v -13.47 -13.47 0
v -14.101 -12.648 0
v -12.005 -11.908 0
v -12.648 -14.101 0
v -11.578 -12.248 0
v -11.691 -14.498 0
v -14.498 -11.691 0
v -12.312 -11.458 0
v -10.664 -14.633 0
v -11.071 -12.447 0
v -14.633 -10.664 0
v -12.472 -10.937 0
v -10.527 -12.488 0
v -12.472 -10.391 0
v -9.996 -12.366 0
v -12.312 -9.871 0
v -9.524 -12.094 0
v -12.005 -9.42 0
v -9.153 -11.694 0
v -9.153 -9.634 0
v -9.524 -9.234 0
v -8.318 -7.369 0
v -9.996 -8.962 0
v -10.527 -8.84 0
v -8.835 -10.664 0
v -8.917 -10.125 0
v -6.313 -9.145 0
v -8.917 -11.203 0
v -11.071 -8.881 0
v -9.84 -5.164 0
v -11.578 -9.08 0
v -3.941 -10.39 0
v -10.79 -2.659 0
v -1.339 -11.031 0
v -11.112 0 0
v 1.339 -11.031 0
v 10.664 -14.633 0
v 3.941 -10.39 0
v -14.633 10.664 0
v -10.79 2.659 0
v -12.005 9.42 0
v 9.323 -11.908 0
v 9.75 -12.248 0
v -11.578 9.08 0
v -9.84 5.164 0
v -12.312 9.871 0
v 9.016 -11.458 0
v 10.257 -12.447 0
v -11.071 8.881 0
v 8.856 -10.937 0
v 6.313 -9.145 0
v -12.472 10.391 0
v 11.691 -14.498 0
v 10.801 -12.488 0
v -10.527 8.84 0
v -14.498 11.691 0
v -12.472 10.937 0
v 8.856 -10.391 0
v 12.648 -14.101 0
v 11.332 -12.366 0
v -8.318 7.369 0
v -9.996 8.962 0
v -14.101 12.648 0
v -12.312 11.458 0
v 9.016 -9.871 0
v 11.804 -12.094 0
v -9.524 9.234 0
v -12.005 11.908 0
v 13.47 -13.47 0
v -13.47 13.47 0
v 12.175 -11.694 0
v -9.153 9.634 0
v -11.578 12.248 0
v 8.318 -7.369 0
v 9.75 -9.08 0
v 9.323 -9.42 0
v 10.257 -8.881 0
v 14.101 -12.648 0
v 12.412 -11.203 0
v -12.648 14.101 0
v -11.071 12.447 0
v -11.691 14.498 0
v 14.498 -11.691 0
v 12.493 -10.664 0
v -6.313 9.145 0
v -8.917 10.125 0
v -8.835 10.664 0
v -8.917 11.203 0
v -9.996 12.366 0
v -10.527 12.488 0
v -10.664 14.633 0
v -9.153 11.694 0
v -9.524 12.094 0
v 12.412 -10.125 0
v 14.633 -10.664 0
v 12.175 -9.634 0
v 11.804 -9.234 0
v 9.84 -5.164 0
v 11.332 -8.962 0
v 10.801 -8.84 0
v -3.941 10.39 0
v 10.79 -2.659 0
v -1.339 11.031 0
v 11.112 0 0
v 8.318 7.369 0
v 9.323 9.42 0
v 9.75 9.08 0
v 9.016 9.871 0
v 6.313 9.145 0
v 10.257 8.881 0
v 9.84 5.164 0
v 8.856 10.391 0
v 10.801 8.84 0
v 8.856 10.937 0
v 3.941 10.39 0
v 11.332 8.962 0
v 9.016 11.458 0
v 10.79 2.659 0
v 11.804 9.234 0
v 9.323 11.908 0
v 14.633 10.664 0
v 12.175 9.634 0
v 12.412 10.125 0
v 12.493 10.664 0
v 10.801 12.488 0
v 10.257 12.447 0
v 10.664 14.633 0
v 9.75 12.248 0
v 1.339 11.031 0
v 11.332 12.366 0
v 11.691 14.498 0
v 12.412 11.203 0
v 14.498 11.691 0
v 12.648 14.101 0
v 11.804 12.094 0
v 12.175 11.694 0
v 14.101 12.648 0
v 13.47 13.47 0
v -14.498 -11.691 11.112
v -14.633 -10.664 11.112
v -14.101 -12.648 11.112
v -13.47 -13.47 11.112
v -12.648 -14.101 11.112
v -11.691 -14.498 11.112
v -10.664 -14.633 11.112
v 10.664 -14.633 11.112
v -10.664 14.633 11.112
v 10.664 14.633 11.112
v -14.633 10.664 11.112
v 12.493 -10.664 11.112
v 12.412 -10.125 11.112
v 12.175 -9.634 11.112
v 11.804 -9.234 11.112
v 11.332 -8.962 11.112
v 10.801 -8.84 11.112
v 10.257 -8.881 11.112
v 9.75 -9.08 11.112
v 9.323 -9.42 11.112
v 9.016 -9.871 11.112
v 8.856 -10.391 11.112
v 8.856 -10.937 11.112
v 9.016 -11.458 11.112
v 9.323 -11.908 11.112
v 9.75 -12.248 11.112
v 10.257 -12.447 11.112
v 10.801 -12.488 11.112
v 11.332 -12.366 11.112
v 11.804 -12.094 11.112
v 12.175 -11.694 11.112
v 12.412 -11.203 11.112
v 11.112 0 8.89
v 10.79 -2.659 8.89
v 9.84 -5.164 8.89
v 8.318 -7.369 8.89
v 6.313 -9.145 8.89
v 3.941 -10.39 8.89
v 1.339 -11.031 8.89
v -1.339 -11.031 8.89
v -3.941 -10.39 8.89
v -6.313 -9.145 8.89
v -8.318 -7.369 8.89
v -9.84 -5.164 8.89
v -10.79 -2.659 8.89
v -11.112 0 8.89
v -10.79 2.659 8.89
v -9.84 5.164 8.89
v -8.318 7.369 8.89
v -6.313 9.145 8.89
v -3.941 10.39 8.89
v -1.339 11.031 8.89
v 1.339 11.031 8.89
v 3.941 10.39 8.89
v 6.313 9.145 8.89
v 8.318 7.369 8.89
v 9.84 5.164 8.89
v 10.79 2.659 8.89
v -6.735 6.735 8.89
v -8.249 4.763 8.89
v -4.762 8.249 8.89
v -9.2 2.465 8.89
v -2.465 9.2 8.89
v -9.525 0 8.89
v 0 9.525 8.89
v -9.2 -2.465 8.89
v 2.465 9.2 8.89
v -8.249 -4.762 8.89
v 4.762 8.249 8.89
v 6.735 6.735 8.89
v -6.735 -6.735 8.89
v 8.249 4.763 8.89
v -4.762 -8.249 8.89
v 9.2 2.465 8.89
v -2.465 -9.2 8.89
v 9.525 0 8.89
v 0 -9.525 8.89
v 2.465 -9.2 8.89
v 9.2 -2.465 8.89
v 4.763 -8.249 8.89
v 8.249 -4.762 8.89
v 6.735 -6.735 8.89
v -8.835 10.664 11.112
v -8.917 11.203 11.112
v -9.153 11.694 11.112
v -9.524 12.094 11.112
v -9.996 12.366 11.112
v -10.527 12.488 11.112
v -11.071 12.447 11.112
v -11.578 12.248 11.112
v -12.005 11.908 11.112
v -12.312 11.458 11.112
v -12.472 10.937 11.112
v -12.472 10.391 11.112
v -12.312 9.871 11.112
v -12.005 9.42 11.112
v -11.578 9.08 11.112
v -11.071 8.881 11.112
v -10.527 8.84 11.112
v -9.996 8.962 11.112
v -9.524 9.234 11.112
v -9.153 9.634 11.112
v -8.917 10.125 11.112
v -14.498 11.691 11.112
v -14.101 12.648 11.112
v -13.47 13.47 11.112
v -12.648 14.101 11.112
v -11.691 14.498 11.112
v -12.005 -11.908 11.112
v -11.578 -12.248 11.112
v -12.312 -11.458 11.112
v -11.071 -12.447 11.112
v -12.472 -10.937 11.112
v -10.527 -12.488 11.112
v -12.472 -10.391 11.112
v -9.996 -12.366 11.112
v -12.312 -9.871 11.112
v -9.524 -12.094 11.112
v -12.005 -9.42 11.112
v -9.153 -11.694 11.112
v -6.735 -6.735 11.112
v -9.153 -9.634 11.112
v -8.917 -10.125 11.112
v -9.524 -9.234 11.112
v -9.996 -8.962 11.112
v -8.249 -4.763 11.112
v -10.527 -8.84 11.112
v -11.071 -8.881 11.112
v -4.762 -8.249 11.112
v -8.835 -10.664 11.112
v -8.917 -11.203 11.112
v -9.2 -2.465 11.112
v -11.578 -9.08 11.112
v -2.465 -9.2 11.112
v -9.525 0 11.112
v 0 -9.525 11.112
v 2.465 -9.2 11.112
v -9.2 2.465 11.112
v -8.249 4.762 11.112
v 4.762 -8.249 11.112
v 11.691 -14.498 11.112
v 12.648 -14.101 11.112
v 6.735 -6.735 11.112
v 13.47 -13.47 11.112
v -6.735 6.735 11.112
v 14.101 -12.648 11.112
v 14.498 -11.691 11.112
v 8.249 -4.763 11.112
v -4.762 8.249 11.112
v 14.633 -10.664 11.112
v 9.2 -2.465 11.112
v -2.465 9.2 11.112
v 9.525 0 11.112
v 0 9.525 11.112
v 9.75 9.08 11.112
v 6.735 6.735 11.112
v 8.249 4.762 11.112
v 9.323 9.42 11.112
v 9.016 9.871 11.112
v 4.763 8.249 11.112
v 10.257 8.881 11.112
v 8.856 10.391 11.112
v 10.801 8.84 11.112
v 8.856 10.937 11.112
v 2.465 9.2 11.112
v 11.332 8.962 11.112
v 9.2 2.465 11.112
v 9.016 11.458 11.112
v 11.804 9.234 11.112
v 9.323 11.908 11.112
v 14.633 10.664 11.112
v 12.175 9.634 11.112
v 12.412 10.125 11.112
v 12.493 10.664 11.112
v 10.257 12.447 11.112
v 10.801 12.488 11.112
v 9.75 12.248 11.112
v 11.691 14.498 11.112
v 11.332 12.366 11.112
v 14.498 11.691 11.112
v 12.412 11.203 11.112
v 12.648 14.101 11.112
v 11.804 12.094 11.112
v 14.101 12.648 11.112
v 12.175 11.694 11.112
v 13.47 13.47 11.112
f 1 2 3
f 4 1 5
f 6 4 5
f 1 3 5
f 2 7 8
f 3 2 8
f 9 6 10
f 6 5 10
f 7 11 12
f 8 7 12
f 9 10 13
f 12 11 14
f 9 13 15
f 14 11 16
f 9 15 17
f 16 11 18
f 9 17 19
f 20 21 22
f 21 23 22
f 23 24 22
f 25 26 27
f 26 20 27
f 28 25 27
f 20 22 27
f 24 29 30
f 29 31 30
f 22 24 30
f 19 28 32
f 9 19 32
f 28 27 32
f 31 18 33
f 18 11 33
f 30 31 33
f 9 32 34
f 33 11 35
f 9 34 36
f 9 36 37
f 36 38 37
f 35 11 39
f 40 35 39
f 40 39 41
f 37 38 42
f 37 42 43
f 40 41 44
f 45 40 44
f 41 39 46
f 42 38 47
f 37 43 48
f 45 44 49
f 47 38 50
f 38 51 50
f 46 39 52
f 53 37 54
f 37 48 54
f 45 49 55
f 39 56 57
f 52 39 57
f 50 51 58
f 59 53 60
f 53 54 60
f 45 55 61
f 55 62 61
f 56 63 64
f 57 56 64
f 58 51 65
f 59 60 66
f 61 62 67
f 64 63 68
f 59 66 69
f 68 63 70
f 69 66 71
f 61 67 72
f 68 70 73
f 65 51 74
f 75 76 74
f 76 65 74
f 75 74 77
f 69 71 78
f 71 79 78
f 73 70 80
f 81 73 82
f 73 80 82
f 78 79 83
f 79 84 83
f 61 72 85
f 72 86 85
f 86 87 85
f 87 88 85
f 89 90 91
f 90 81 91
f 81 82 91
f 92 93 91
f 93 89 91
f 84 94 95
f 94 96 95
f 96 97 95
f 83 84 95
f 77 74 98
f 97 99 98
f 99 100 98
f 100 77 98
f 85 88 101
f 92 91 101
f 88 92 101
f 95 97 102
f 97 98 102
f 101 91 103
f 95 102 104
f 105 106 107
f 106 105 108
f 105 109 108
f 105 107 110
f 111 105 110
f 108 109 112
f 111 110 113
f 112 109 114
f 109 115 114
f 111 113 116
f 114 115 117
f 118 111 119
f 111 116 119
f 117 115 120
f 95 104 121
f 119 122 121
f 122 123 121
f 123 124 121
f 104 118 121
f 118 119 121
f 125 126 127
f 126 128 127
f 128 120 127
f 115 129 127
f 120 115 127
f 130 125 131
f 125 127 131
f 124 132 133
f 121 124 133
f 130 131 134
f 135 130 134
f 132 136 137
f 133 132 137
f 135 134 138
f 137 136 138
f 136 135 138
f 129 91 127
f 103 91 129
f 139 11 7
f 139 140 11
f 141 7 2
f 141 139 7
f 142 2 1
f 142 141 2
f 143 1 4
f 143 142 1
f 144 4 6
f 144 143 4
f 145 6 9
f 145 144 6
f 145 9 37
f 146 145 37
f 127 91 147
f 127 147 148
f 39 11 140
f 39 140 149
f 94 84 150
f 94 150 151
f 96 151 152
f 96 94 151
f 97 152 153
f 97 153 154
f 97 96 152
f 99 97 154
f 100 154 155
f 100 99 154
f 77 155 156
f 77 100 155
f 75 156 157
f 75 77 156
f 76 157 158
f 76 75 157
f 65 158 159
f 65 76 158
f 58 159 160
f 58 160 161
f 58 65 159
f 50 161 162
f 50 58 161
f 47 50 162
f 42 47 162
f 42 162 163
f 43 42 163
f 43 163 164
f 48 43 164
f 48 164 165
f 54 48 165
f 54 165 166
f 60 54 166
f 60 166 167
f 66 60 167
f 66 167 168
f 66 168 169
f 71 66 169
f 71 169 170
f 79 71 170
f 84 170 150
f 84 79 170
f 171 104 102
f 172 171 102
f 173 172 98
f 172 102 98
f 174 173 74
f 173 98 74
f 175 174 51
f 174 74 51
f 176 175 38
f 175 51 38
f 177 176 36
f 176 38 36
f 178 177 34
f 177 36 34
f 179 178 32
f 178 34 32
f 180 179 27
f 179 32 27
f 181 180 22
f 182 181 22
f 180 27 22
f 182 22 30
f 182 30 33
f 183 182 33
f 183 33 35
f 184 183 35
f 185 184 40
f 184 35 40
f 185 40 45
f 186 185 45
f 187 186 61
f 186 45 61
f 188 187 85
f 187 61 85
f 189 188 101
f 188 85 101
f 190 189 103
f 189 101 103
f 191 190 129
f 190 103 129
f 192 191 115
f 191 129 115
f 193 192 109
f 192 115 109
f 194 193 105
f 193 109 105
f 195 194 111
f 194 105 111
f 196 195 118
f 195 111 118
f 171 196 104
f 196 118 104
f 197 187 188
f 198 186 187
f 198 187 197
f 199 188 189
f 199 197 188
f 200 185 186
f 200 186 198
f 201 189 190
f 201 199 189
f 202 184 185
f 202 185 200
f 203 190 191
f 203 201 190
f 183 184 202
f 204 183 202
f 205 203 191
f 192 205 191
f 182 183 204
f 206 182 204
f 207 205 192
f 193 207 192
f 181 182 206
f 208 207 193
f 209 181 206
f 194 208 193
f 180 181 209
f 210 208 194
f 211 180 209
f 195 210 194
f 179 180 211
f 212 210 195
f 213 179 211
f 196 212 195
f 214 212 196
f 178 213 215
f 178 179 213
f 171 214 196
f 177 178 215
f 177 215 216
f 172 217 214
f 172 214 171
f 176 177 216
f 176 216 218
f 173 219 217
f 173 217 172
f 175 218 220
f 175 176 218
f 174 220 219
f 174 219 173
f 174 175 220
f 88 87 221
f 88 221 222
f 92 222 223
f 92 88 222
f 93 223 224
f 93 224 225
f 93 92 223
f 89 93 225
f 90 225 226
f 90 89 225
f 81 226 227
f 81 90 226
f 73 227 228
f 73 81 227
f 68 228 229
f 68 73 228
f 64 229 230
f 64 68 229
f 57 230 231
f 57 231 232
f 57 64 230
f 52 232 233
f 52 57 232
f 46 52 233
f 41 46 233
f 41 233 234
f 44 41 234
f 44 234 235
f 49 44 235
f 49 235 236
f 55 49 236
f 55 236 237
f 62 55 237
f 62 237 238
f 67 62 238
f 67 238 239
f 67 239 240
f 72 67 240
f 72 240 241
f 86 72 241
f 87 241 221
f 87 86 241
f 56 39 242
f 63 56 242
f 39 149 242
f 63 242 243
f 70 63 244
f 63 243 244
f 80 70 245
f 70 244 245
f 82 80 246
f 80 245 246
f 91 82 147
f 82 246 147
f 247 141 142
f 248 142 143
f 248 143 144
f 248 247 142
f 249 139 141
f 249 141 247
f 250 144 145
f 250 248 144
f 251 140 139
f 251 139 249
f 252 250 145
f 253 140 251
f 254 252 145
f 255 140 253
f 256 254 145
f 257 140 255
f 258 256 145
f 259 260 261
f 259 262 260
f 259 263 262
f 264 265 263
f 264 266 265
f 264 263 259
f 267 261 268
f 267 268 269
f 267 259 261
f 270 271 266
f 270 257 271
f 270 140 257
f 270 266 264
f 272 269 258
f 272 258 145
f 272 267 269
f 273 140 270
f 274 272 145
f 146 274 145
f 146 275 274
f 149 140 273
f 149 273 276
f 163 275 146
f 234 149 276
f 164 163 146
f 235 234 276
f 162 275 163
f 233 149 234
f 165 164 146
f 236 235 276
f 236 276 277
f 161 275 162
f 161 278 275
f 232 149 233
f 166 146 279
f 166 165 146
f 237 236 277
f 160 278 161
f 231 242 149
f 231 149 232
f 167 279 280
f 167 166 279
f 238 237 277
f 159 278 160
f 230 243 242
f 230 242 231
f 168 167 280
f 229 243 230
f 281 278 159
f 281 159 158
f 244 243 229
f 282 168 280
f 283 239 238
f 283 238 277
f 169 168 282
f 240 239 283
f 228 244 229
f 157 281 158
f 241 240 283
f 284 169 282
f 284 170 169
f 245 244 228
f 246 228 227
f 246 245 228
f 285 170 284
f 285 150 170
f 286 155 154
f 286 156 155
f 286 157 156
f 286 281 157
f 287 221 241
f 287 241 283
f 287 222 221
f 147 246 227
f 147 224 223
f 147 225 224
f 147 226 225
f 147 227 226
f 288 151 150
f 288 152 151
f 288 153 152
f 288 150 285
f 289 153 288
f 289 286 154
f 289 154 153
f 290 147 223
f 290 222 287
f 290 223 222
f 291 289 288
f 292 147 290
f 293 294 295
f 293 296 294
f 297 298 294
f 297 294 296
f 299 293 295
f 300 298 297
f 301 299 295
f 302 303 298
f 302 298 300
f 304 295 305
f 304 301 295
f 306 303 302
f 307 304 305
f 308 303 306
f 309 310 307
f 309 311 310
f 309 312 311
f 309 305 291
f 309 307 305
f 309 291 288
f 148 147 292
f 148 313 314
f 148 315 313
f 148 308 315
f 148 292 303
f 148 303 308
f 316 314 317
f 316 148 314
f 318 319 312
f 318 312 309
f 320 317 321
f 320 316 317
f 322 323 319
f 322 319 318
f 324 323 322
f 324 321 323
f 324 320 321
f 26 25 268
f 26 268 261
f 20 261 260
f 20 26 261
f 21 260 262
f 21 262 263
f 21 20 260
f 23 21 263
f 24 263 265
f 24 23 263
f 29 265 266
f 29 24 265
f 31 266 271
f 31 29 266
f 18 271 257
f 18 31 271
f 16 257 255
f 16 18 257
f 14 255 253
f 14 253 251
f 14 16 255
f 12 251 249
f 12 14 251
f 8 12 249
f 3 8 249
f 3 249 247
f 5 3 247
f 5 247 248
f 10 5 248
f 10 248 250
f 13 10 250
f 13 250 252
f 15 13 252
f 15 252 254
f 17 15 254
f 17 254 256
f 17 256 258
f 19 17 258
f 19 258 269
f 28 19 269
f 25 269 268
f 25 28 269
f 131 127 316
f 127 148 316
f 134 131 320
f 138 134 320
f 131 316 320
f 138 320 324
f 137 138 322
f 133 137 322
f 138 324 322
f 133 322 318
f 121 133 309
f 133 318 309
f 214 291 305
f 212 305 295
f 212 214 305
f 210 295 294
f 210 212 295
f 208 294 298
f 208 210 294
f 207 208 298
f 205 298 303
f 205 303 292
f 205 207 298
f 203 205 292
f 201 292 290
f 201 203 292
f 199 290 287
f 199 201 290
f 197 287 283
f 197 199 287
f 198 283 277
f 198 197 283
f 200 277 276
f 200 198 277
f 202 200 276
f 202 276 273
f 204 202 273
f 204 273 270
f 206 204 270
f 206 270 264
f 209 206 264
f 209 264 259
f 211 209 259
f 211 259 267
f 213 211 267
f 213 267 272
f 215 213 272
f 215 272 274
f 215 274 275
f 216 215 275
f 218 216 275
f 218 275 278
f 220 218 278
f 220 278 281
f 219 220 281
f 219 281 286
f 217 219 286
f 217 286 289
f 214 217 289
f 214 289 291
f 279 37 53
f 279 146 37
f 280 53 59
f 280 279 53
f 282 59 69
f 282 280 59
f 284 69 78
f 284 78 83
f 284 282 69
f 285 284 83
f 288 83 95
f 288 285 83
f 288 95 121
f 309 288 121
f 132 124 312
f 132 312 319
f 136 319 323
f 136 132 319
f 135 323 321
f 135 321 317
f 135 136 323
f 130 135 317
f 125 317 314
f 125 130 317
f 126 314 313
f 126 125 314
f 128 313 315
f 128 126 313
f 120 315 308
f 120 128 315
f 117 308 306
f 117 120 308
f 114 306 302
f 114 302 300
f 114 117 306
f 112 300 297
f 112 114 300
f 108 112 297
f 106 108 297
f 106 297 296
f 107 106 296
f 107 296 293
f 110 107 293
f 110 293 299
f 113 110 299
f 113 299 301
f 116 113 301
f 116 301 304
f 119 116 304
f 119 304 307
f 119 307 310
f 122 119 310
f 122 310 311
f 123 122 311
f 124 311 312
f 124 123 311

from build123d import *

# Parameters (mm, degrees)
F0_W     = 29.265608
F0_H     = 29.265608
F0_R     = 1.8288
F0_R_2   = 9.525
F1_DEPTH = 11.1125
F2_R     = 3.96875
F3_R     = 11.1125
F4_DEPTH = 8.89


with BuildPart() as f1:
    # F0 (on Top) → F1 (new body)
    with BuildSketch(Plane.XY):
        Rectangle(F0_W, F0_H)
        with Locations((-10.664054, -10.664054)):
            Circle(F0_R, mode=Mode.SUBTRACT)
        with Locations((10.664054, -10.664054)):
            Circle(F0_R, mode=Mode.SUBTRACT)
        with Locations((-10.664054, 10.664054)):
            Circle(F0_R, mode=Mode.SUBTRACT)
        Circle(F0_R_2, mode=Mode.SUBTRACT)
        with Locations((10.664054, 10.664054)):
            Circle(F0_R, mode=Mode.SUBTRACT)
    extrude(amount=F1_DEPTH)

    # F2
    f2_edges = [f1.edges().sort_by_distance(p)[0] for p in [
        (-14.632804, 14.632804, 5.55625),
        (-14.632804, -14.632804, 5.55625),
        (14.632804, -14.632804, 5.55625),
        (14.632804, 14.632804, 5.55625),
    ]]
    fillet(f2_edges, radius=F2_R)

    # F3 (on face) → F4 (cut)
    with BuildSketch(Plane(origin=(0, 0, 0), x_dir=(1, 0, 0), z_dir=(0, 0, -1))):
        Circle(F3_R)
    extrude(amount=-F4_DEPTH, mode=Mode.SUBTRACT)


solid = f1.part
